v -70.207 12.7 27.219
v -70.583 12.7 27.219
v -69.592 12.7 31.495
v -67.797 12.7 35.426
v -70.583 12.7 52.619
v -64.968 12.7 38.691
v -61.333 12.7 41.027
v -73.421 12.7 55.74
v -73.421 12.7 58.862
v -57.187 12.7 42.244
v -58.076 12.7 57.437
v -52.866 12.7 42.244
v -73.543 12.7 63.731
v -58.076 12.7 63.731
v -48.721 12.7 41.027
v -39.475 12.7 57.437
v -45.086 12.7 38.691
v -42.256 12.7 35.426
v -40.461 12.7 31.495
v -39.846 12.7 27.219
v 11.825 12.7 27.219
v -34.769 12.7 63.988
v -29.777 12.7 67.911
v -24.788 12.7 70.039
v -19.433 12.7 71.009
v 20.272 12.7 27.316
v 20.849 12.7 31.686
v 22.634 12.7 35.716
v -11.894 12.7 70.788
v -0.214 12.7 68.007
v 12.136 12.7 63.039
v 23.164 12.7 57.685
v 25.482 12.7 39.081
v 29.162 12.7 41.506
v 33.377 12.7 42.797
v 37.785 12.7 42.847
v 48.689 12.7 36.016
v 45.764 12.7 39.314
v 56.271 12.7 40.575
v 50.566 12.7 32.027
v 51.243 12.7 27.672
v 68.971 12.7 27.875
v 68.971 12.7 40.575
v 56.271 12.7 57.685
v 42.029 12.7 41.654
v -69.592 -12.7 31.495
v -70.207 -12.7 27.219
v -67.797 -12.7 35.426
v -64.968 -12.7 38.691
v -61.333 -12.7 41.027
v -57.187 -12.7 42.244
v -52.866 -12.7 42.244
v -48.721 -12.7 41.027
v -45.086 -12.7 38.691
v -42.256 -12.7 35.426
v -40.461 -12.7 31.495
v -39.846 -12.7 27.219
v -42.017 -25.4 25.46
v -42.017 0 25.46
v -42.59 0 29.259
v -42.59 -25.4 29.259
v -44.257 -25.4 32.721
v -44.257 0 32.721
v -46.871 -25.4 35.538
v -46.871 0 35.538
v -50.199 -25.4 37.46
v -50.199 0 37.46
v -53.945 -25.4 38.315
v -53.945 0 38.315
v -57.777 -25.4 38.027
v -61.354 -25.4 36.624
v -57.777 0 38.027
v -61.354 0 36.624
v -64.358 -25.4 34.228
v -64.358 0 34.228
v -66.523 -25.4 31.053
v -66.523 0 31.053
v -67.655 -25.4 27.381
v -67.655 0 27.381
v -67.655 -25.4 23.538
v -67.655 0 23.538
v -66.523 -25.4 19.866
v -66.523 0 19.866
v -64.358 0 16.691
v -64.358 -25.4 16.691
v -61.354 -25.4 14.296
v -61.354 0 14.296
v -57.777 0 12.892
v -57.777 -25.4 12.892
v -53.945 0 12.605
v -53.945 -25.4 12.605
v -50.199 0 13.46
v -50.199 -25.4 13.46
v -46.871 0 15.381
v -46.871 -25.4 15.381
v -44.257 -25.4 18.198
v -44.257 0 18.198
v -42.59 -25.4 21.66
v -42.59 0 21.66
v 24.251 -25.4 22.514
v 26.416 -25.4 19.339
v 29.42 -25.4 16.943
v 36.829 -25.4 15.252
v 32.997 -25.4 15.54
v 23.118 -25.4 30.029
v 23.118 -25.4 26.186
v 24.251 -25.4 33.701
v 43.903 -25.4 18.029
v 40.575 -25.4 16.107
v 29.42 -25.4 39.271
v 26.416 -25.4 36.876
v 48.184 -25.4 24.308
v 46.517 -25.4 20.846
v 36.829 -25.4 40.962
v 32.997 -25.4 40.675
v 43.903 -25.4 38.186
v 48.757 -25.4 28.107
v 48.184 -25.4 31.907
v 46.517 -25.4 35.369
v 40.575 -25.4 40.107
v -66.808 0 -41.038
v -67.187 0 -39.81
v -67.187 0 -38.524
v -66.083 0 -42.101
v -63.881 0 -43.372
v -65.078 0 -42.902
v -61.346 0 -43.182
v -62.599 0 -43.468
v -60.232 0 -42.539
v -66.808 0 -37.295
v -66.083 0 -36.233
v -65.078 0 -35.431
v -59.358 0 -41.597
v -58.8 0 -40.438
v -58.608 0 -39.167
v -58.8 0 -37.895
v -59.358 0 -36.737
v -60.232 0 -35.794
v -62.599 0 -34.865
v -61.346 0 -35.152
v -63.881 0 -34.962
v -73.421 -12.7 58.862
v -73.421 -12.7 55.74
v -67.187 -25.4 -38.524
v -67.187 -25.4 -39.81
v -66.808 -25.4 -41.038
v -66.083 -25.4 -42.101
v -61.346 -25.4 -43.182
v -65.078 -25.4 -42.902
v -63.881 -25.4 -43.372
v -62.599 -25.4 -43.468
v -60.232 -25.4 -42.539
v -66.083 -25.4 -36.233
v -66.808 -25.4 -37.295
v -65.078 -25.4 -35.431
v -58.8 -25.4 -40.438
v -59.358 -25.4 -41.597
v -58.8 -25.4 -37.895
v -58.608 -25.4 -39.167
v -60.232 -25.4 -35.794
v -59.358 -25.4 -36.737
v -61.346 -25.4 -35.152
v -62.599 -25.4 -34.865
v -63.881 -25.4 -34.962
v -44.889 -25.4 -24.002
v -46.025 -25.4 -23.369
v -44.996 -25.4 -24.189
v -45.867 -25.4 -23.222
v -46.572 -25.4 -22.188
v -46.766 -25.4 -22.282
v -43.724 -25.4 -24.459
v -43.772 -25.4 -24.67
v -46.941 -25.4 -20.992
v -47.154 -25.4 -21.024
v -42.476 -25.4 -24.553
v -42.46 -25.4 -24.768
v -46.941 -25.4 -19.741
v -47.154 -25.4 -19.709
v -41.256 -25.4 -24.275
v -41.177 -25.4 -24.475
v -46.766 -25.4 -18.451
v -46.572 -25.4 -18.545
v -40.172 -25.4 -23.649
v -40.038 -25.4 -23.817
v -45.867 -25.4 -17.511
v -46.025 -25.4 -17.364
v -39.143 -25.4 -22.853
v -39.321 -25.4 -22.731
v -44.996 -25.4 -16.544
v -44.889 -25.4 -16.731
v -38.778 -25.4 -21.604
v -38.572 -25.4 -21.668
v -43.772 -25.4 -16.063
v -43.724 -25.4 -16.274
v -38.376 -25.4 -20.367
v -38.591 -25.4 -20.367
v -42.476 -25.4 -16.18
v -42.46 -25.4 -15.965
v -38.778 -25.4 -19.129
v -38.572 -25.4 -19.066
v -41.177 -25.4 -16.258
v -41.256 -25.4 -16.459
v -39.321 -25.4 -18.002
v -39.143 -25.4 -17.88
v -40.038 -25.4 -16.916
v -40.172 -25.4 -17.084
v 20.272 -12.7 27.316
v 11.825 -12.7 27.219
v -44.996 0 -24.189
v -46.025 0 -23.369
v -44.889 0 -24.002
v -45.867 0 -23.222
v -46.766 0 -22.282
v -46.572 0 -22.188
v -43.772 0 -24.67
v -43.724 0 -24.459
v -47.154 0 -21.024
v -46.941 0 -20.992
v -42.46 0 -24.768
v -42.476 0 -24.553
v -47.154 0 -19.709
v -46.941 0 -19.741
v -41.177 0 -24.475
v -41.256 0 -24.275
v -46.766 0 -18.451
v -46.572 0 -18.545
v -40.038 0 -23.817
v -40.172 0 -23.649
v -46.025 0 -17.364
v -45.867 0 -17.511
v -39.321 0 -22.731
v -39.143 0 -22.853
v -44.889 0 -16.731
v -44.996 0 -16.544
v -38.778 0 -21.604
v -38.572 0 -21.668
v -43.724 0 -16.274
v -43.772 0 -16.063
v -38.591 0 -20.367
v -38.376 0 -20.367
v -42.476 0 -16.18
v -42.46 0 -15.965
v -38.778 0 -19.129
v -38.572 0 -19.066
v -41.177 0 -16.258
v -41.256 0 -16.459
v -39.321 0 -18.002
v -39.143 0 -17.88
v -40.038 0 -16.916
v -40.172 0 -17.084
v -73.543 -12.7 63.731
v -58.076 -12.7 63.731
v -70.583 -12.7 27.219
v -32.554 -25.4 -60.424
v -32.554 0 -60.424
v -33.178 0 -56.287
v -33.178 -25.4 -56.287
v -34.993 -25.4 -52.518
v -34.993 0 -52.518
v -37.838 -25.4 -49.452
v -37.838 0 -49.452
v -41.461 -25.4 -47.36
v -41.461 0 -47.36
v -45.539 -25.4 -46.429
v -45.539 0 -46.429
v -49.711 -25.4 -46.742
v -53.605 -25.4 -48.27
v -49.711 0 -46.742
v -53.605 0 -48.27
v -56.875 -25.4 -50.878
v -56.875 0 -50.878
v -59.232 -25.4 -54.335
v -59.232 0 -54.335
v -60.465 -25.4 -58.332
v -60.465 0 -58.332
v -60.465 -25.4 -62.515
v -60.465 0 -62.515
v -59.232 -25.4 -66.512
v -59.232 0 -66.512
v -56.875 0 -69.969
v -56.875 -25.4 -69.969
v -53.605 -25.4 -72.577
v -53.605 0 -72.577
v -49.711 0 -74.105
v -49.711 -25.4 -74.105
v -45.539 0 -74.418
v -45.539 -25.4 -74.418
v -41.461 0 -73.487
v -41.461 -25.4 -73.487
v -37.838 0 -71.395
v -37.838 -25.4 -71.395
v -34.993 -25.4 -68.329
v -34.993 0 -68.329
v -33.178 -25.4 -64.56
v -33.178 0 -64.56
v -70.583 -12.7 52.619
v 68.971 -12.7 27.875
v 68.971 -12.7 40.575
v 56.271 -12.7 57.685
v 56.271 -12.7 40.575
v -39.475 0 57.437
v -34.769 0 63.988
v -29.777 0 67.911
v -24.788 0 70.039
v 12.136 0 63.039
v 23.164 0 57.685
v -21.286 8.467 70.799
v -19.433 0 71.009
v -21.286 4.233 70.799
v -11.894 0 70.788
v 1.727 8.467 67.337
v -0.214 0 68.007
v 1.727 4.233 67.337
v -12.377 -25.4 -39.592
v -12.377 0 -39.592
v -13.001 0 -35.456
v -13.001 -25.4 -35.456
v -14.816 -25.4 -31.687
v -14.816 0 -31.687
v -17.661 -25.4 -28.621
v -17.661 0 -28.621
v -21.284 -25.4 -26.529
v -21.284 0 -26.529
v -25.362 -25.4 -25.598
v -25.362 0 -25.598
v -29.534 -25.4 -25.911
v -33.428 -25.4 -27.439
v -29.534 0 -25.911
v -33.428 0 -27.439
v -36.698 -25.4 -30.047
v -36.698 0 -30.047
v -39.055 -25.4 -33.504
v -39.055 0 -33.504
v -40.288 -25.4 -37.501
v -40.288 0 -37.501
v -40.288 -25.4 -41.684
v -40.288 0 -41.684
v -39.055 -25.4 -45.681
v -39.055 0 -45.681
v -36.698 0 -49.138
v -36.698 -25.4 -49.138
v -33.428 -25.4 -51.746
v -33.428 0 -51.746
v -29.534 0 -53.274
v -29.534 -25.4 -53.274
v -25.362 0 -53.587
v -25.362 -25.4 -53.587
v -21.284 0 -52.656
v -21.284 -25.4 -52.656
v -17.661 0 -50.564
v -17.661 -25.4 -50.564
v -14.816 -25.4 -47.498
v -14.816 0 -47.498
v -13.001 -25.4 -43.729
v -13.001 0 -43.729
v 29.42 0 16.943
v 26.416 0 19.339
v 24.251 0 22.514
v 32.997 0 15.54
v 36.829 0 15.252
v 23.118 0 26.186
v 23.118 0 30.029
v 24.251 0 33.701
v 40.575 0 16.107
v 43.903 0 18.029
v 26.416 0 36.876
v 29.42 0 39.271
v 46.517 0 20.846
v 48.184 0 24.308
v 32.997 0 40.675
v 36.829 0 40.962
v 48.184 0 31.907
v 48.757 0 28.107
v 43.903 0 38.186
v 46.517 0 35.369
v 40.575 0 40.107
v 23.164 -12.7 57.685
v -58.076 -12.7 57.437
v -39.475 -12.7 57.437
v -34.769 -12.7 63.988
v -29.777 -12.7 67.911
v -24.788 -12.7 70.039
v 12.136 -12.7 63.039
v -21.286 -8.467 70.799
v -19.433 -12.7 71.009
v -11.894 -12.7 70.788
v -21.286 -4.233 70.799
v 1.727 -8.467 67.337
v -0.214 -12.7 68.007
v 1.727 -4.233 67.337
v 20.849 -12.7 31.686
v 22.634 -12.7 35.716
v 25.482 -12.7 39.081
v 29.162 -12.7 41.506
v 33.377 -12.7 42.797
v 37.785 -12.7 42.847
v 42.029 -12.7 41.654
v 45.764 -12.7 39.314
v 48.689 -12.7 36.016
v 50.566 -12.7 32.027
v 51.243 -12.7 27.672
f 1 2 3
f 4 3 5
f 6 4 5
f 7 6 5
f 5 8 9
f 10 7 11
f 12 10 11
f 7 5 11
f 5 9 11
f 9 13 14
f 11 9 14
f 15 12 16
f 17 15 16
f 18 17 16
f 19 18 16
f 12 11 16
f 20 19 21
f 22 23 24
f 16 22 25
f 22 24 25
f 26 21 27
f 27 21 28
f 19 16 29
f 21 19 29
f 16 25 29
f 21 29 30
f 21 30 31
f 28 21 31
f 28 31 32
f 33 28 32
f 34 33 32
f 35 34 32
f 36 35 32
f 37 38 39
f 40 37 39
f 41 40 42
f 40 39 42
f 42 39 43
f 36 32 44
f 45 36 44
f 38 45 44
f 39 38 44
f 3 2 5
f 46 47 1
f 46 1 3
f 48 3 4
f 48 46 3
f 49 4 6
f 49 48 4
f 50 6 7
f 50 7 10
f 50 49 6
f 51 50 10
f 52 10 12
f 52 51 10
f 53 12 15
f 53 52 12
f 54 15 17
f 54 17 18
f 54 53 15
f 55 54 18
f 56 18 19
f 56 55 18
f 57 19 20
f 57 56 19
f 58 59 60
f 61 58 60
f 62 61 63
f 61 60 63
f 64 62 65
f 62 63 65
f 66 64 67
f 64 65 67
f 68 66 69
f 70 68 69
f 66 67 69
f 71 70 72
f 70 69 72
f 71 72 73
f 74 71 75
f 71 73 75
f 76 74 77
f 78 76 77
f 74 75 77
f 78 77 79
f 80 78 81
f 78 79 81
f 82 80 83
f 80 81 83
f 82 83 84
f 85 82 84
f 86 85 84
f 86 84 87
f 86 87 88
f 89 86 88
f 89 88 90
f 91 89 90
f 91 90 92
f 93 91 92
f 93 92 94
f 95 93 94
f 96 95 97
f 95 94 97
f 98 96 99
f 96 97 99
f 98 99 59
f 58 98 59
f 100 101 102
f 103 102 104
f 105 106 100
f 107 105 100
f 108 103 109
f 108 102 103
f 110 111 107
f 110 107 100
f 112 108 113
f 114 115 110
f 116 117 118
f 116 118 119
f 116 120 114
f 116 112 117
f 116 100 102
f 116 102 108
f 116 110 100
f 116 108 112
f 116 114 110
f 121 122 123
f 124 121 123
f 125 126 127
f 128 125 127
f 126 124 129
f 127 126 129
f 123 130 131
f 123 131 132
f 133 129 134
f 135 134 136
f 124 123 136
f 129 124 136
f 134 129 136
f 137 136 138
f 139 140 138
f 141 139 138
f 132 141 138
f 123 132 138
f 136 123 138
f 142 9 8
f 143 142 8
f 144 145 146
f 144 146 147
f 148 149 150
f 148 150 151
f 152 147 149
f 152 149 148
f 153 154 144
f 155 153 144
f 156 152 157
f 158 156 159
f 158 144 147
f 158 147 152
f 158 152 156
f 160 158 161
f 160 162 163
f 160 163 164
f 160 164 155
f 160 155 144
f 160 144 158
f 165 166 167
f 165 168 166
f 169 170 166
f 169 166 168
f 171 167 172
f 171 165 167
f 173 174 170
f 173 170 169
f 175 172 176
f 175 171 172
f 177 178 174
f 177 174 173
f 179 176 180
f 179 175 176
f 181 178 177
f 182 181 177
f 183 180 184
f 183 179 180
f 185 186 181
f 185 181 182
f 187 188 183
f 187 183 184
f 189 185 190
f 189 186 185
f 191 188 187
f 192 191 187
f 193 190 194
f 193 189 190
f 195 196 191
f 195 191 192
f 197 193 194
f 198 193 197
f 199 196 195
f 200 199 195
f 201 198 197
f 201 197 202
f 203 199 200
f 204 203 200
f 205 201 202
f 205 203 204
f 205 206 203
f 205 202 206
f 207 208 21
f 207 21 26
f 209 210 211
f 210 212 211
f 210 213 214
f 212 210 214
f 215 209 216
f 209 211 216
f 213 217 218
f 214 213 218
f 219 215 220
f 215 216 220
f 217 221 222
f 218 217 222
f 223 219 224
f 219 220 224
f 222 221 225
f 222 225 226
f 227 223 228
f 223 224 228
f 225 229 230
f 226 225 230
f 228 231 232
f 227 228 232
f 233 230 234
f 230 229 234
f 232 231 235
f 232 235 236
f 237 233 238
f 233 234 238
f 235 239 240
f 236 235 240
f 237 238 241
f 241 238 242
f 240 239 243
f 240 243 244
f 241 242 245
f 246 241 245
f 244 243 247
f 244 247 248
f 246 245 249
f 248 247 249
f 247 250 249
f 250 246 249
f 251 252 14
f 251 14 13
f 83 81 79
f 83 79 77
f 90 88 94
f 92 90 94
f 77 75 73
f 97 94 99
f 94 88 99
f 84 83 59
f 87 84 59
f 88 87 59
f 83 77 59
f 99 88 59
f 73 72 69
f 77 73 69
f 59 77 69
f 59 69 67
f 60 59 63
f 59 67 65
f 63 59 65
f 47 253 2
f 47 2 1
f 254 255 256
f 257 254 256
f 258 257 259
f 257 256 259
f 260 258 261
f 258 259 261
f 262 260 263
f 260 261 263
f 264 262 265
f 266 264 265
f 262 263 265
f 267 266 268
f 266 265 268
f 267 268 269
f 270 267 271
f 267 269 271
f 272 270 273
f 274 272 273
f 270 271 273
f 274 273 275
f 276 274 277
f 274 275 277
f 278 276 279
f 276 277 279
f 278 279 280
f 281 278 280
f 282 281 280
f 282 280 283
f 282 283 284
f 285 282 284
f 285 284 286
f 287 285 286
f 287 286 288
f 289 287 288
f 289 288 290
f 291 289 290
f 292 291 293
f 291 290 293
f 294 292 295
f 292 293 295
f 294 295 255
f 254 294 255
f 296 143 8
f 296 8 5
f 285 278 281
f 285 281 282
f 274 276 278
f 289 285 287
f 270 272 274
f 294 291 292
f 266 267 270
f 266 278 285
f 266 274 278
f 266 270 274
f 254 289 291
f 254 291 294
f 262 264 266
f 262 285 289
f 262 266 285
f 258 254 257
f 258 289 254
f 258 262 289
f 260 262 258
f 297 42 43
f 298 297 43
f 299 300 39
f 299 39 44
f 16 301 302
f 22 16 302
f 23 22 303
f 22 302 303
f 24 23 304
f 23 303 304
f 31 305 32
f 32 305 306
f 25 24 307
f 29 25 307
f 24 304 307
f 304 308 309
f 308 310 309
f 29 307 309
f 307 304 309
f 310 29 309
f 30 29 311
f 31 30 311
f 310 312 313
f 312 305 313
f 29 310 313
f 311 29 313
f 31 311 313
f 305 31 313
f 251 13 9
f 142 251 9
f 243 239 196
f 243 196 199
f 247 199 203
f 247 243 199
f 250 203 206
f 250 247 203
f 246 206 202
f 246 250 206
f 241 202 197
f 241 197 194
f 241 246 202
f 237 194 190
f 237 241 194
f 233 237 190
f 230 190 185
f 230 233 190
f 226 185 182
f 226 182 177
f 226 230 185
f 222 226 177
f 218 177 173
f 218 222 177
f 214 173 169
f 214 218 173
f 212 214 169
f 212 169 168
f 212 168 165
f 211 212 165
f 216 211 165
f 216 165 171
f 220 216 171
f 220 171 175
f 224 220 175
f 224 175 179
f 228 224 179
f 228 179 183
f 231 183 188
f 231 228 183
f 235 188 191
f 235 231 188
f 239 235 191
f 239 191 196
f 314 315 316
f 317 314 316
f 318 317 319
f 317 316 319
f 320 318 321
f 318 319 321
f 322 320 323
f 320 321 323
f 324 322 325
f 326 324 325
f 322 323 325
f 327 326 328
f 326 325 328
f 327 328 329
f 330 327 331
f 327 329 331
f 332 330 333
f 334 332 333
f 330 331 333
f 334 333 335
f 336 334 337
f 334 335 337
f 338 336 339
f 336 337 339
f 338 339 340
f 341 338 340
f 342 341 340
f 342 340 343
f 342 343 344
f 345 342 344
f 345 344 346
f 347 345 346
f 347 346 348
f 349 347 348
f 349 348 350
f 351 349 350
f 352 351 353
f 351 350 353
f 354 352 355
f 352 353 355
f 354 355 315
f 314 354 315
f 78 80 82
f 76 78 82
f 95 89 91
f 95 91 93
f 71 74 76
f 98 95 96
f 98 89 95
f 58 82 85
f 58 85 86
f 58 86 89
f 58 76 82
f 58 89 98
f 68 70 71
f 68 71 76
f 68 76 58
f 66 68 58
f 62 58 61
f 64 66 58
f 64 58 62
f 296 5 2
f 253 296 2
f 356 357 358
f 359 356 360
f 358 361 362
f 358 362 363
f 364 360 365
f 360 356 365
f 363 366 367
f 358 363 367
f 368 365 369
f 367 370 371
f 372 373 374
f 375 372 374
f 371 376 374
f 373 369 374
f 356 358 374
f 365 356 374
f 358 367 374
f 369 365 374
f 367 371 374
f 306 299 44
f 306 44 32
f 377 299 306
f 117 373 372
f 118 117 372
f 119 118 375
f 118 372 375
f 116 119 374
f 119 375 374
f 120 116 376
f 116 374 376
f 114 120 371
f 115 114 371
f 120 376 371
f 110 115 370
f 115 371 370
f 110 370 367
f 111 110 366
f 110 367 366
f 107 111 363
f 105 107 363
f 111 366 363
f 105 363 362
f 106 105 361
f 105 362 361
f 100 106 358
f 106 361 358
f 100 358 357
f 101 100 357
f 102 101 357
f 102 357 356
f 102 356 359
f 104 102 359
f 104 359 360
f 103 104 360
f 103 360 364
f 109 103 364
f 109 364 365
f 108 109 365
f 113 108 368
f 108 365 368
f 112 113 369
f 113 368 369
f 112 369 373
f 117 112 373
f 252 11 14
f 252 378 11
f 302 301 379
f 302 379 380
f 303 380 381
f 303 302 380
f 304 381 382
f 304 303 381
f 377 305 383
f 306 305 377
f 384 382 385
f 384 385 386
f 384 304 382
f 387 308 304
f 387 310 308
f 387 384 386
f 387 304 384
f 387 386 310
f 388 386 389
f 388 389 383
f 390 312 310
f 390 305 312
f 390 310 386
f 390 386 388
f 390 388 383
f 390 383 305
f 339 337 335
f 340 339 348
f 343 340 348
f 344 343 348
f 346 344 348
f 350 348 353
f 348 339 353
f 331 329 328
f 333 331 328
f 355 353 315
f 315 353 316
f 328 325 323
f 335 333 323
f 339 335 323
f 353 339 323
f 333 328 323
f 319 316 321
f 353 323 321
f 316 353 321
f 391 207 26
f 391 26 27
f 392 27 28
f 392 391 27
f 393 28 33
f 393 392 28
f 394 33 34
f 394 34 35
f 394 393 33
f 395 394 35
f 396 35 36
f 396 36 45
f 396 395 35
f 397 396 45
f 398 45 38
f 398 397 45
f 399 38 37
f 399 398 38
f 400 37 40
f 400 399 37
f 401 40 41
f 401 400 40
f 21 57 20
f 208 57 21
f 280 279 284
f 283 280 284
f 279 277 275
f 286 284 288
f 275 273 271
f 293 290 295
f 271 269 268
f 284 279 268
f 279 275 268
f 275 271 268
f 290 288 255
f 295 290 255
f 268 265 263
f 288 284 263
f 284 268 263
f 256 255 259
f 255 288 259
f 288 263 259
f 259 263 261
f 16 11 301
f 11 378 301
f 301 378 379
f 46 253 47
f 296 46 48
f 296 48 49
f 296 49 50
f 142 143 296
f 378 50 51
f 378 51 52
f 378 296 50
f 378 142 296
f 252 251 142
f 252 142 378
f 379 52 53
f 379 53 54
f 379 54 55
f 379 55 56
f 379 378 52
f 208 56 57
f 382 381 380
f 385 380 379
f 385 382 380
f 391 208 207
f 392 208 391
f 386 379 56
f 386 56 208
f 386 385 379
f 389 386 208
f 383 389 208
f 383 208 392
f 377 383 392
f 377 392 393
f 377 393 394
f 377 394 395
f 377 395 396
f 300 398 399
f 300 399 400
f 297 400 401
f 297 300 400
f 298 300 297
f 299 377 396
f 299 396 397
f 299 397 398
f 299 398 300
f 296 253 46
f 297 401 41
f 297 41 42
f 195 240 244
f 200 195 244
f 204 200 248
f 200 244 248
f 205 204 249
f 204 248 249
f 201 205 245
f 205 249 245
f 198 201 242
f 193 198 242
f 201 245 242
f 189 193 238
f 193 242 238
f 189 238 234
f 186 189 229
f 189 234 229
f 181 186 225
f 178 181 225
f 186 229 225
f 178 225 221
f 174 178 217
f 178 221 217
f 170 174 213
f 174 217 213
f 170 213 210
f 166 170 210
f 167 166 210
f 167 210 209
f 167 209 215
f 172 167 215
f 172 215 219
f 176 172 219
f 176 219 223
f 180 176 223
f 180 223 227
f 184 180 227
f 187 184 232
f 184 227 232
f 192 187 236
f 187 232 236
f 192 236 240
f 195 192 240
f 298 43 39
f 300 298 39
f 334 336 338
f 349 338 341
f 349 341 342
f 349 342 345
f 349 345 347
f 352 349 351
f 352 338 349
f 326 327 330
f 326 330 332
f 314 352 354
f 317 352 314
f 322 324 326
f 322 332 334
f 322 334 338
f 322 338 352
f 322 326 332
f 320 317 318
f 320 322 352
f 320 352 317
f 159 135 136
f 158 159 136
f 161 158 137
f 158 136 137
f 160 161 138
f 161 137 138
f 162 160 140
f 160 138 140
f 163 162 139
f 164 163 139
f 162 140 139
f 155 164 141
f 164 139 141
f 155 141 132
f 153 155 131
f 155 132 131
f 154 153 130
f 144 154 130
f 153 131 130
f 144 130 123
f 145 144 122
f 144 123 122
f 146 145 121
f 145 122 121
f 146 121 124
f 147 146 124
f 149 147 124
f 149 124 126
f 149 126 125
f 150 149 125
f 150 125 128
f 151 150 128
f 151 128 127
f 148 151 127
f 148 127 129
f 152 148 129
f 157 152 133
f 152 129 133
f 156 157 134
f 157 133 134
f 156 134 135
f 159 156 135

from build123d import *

# Parameters (mm, degrees)
F0_W     = 50.8
F0_H     = 8.048554721
F0_W_2   = 18.6008806118
F0_H_2   = 6.2944726395
F1_DEPTH = 12.7
F2_R     = 12.8910501965
F3_DEPTH = 25.4
F2_R_2   = 4.4138047906
F2_R_3   = 4.1981567518
F2_R_4   = 4.3133772
F2_R_5   = 14.0335


with BuildPart() as f1:
    # F0 (on Front) → F1 (new body, symmetric)
    with BuildSketch(Plane.XZ):
        with BuildLine():
            Line((-73.4209669053, 55.7403657233), (-70.5829752063, 52.6185790514))
            Line((-70.5829752063, 52.6185790514), (-70.5829752063, 27.2185790514))
            Line((-70.5829752063, 27.2185790514), (-70.2070189452, 27.2185790514))
            ThreePointArc((-70.2070189452, 27.2185790514), (-55.0267063081, 42.3988916884), (-39.846393671, 27.2185790514))
            Line((-39.846393671, 27.2185790514), (11.8251257334, 27.2185790514))
            Line((11.8251257334, 27.2185790514), (20.271542769, 27.3156640365))
            ThreePointArc((20.271542769, 27.3156640365), (35.5794324636, 42.979550171), (51.2433185982, 27.6716604765))
            Line((51.2433185982, 27.6716604765), (68.9713508607, 27.8754303994))
            Line((68.9713508607, 27.8754303994), (68.9713508607, 40.5754303994))
            Line((68.9713508607, 40.5754303994), (56.2713508607, 40.5754303994))
            Line((56.2713508607, 40.5754303994), (56.2713508607, 57.6852942501))
            Line((56.2713508607, 57.6852942501), (41.7381572862, 57.6852942501))
            Line((41.7381572862, 57.6852942501), (23.1638532132, 57.6852942501))
            Line((23.1638532132, 57.6852942501), (11.3245324561, 57.6852942501))
            Line((11.3245324561, 57.6852942501), (11.3245324561, 51.1421337724))
            Line((11.3245324561, 51.1421337724), (11.3245324561, 43.0935790514))
            Line((11.3245324561, 43.0935790514), (-39.4754675439, 43.0935790514))
            Line((-39.4754675439, 43.0935790514), (-39.4754675439, 51.1421337724))
            Line((-39.4754675439, 51.1421337724), (-58.0763481557, 51.1421337724))
            Line((-58.0763481557, 51.1421337724), (-58.0763481557, 57.4366064119))
            Line((-58.0763481557, 57.4366064119), (-58.0763481557, 63.7310790514))
            Line((-58.0763481557, 63.7310790514), (-73.5433474183, 63.7310790514))
            Line((-73.5433474183, 63.7310790514), (-73.4209669053, 58.8621565922))
            Line((-73.4209669053, 58.8621565922), (-73.4209669053, 55.7403657233))
        make_face()
        with BuildLine():
            add(Edge.make_bspline(
                [(-39.4754675439, 57.4366064119), (-25.8321780711, 82.7565342188), (4.6486416832, 66.8863579631), (23.1638532132, 57.6852942501)],
                knots=[0, 0, 0, 0, 62.6398144198, 62.6398144198, 62.6398144198, 62.6398144198], degree=3))
            Line((-39.4754675439, 57.4366064119), (-39.4754675439, 51.1421337724))
            Line((-39.4754675439, 51.1421337724), (11.3245324561, 51.1421337724))
            Line((11.3245324561, 51.1421337724), (11.3245324561, 57.6852942501))
            Line((11.3245324561, 57.6852942501), (23.1638532132, 57.6852942501))
        make_face()
        with Locations((-14.0754675439, 47.1178564119)):
            Rectangle(F0_W, F0_H)
        with Locations((-48.7759078498, 54.2893700921)):
            Rectangle(F0_W_2, F0_H_2)
    extrude(amount=F1_DEPTH, both=True)


with BuildPart() as f3:
    # F2 (on Front) → F3 (new body)
    with BuildSketch(Plane.XZ):
        with Locations((-54.90841344, 25.4596043378)):
            Circle(F2_R)
    extrude(amount=F3_DEPTH)


with BuildPart() as f3b:
    # F2 (on Front) → F3, piece 2 (new body)
    with BuildSketch(Plane.XZ):
        with Locations((35.8654521406, 28.1074233353)):
            Circle(F2_R)
    extrude(amount=F3_DEPTH)


with BuildPart() as f3c:
    # F2 (on Front) → F3, piece 3 (new body)
    with BuildSketch(Plane.XZ):
        with Locations((-42.7895486355, -20.3665606678)):
            Circle(F2_R_2)
        with Locations((-42.7895486355, -20.3665606678)):
            Circle(F2_R_3, mode=Mode.SUBTRACT)
    extrude(amount=F3_DEPTH)


with BuildPart() as f3d:
    # F2 (on Front) → F3, piece 4 (new body)
    with BuildSketch(Plane.XZ):
        with Locations((-62.9214718938, -39.1667969525)):
            Circle(F2_R_4)
    extrude(amount=F3_DEPTH)


with BuildPart() as f3e:
    # F2 (on Front) → F3, piece 5 (new body)
    with BuildSketch(Plane.XZ):
        with Locations((-46.5879403055, -60.42355299)):
            Circle(F2_R_5)
    extrude(amount=F3_DEPTH)


with BuildPart() as f3f:
    # F2 (on Front) → F3, piece 6 (new body)
    with BuildSketch(Plane.XZ):
        with Locations((-26.410985738, -39.5924076438)):
            Circle(F2_R_5)
    extrude(amount=F3_DEPTH)


solid = Compound([f1.part, f3.part, f3b.part, f3c.part, f3d.part, f3e.part, f3f.part])
